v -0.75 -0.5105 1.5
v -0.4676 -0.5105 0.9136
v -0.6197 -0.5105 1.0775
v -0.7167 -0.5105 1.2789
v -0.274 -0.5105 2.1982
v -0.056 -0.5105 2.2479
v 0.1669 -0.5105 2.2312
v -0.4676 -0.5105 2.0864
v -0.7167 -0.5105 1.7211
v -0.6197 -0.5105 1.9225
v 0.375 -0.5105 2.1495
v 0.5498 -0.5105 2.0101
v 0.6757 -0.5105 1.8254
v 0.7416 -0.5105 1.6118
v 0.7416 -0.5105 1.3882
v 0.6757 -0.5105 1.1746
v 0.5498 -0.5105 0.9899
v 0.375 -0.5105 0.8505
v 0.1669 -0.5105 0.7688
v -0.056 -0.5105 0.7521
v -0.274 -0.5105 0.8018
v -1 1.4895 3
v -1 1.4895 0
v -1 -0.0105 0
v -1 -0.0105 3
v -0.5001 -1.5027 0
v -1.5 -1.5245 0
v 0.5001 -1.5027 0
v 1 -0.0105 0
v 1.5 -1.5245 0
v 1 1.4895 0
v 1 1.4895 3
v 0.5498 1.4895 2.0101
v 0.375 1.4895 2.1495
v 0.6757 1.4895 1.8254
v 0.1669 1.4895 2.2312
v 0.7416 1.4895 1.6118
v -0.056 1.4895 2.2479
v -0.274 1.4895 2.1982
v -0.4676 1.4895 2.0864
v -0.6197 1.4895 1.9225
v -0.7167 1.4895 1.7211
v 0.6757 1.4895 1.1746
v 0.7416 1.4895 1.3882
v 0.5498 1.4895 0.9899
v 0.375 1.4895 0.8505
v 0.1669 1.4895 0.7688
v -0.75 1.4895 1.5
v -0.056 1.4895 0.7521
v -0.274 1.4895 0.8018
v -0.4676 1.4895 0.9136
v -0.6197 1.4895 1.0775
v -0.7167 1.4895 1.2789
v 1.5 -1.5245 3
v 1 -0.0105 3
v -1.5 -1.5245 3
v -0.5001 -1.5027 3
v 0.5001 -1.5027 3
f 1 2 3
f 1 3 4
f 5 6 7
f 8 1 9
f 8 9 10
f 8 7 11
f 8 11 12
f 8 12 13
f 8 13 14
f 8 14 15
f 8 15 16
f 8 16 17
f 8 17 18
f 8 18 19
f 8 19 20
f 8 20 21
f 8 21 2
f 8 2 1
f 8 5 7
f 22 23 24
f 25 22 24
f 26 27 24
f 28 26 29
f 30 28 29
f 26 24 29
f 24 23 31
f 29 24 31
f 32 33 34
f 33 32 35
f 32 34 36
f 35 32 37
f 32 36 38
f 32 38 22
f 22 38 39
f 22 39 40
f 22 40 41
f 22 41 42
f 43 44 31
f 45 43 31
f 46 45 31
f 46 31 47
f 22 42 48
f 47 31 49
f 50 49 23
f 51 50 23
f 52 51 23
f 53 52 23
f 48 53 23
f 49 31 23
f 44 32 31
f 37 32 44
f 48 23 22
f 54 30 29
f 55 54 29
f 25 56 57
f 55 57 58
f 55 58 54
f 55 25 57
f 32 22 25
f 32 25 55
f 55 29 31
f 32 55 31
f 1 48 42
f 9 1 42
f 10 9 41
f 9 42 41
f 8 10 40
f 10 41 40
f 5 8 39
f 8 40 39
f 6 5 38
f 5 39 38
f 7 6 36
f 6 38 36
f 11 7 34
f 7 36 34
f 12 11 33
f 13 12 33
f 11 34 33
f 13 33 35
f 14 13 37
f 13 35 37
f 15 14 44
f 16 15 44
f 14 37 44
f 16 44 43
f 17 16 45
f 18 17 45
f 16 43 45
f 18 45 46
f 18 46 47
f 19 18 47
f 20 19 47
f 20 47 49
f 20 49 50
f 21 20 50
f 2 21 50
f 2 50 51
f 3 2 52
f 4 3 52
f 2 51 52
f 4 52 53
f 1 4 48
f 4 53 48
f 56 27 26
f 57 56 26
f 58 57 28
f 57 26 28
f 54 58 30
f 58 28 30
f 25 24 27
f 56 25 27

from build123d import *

# Parameters (mm, degrees)
F1_DEPTH = 3
F2_R     = 0.75
F3_DEPTH = 2


with BuildPart() as f1:
    # F0 (on Top) → F1 (new body)
    with BuildSketch(Plane.XY):
        with BuildLine():
            Line((-1, -0.010527), (-1.5, -1.524463))
            ThreePointArc((-1.5, -1.524463), (0, -1.5), (1.5, -1.524463))
            Line((1.5, -1.524463), (1, -0.010527))
            Line((1, -0.010527), (1, 1.489473))
            Line((1, 1.489473), (-1, 1.489473))
            Line((-1, 1.489473), (-1, -0.010527))
        make_face()
    extrude(amount=F1_DEPTH)

    # F2 (on face) → F3 (cut)
    with BuildSketch(Plane(origin=(0, 1.489473, 0), x_dir=(-1, 0, 0), z_dir=(0, 1, 0))):
        with Locations((0, 1.5)):
            Circle(F2_R)
    extrude(amount=-F3_DEPTH, mode=Mode.SUBTRACT)


solid = f1.part
